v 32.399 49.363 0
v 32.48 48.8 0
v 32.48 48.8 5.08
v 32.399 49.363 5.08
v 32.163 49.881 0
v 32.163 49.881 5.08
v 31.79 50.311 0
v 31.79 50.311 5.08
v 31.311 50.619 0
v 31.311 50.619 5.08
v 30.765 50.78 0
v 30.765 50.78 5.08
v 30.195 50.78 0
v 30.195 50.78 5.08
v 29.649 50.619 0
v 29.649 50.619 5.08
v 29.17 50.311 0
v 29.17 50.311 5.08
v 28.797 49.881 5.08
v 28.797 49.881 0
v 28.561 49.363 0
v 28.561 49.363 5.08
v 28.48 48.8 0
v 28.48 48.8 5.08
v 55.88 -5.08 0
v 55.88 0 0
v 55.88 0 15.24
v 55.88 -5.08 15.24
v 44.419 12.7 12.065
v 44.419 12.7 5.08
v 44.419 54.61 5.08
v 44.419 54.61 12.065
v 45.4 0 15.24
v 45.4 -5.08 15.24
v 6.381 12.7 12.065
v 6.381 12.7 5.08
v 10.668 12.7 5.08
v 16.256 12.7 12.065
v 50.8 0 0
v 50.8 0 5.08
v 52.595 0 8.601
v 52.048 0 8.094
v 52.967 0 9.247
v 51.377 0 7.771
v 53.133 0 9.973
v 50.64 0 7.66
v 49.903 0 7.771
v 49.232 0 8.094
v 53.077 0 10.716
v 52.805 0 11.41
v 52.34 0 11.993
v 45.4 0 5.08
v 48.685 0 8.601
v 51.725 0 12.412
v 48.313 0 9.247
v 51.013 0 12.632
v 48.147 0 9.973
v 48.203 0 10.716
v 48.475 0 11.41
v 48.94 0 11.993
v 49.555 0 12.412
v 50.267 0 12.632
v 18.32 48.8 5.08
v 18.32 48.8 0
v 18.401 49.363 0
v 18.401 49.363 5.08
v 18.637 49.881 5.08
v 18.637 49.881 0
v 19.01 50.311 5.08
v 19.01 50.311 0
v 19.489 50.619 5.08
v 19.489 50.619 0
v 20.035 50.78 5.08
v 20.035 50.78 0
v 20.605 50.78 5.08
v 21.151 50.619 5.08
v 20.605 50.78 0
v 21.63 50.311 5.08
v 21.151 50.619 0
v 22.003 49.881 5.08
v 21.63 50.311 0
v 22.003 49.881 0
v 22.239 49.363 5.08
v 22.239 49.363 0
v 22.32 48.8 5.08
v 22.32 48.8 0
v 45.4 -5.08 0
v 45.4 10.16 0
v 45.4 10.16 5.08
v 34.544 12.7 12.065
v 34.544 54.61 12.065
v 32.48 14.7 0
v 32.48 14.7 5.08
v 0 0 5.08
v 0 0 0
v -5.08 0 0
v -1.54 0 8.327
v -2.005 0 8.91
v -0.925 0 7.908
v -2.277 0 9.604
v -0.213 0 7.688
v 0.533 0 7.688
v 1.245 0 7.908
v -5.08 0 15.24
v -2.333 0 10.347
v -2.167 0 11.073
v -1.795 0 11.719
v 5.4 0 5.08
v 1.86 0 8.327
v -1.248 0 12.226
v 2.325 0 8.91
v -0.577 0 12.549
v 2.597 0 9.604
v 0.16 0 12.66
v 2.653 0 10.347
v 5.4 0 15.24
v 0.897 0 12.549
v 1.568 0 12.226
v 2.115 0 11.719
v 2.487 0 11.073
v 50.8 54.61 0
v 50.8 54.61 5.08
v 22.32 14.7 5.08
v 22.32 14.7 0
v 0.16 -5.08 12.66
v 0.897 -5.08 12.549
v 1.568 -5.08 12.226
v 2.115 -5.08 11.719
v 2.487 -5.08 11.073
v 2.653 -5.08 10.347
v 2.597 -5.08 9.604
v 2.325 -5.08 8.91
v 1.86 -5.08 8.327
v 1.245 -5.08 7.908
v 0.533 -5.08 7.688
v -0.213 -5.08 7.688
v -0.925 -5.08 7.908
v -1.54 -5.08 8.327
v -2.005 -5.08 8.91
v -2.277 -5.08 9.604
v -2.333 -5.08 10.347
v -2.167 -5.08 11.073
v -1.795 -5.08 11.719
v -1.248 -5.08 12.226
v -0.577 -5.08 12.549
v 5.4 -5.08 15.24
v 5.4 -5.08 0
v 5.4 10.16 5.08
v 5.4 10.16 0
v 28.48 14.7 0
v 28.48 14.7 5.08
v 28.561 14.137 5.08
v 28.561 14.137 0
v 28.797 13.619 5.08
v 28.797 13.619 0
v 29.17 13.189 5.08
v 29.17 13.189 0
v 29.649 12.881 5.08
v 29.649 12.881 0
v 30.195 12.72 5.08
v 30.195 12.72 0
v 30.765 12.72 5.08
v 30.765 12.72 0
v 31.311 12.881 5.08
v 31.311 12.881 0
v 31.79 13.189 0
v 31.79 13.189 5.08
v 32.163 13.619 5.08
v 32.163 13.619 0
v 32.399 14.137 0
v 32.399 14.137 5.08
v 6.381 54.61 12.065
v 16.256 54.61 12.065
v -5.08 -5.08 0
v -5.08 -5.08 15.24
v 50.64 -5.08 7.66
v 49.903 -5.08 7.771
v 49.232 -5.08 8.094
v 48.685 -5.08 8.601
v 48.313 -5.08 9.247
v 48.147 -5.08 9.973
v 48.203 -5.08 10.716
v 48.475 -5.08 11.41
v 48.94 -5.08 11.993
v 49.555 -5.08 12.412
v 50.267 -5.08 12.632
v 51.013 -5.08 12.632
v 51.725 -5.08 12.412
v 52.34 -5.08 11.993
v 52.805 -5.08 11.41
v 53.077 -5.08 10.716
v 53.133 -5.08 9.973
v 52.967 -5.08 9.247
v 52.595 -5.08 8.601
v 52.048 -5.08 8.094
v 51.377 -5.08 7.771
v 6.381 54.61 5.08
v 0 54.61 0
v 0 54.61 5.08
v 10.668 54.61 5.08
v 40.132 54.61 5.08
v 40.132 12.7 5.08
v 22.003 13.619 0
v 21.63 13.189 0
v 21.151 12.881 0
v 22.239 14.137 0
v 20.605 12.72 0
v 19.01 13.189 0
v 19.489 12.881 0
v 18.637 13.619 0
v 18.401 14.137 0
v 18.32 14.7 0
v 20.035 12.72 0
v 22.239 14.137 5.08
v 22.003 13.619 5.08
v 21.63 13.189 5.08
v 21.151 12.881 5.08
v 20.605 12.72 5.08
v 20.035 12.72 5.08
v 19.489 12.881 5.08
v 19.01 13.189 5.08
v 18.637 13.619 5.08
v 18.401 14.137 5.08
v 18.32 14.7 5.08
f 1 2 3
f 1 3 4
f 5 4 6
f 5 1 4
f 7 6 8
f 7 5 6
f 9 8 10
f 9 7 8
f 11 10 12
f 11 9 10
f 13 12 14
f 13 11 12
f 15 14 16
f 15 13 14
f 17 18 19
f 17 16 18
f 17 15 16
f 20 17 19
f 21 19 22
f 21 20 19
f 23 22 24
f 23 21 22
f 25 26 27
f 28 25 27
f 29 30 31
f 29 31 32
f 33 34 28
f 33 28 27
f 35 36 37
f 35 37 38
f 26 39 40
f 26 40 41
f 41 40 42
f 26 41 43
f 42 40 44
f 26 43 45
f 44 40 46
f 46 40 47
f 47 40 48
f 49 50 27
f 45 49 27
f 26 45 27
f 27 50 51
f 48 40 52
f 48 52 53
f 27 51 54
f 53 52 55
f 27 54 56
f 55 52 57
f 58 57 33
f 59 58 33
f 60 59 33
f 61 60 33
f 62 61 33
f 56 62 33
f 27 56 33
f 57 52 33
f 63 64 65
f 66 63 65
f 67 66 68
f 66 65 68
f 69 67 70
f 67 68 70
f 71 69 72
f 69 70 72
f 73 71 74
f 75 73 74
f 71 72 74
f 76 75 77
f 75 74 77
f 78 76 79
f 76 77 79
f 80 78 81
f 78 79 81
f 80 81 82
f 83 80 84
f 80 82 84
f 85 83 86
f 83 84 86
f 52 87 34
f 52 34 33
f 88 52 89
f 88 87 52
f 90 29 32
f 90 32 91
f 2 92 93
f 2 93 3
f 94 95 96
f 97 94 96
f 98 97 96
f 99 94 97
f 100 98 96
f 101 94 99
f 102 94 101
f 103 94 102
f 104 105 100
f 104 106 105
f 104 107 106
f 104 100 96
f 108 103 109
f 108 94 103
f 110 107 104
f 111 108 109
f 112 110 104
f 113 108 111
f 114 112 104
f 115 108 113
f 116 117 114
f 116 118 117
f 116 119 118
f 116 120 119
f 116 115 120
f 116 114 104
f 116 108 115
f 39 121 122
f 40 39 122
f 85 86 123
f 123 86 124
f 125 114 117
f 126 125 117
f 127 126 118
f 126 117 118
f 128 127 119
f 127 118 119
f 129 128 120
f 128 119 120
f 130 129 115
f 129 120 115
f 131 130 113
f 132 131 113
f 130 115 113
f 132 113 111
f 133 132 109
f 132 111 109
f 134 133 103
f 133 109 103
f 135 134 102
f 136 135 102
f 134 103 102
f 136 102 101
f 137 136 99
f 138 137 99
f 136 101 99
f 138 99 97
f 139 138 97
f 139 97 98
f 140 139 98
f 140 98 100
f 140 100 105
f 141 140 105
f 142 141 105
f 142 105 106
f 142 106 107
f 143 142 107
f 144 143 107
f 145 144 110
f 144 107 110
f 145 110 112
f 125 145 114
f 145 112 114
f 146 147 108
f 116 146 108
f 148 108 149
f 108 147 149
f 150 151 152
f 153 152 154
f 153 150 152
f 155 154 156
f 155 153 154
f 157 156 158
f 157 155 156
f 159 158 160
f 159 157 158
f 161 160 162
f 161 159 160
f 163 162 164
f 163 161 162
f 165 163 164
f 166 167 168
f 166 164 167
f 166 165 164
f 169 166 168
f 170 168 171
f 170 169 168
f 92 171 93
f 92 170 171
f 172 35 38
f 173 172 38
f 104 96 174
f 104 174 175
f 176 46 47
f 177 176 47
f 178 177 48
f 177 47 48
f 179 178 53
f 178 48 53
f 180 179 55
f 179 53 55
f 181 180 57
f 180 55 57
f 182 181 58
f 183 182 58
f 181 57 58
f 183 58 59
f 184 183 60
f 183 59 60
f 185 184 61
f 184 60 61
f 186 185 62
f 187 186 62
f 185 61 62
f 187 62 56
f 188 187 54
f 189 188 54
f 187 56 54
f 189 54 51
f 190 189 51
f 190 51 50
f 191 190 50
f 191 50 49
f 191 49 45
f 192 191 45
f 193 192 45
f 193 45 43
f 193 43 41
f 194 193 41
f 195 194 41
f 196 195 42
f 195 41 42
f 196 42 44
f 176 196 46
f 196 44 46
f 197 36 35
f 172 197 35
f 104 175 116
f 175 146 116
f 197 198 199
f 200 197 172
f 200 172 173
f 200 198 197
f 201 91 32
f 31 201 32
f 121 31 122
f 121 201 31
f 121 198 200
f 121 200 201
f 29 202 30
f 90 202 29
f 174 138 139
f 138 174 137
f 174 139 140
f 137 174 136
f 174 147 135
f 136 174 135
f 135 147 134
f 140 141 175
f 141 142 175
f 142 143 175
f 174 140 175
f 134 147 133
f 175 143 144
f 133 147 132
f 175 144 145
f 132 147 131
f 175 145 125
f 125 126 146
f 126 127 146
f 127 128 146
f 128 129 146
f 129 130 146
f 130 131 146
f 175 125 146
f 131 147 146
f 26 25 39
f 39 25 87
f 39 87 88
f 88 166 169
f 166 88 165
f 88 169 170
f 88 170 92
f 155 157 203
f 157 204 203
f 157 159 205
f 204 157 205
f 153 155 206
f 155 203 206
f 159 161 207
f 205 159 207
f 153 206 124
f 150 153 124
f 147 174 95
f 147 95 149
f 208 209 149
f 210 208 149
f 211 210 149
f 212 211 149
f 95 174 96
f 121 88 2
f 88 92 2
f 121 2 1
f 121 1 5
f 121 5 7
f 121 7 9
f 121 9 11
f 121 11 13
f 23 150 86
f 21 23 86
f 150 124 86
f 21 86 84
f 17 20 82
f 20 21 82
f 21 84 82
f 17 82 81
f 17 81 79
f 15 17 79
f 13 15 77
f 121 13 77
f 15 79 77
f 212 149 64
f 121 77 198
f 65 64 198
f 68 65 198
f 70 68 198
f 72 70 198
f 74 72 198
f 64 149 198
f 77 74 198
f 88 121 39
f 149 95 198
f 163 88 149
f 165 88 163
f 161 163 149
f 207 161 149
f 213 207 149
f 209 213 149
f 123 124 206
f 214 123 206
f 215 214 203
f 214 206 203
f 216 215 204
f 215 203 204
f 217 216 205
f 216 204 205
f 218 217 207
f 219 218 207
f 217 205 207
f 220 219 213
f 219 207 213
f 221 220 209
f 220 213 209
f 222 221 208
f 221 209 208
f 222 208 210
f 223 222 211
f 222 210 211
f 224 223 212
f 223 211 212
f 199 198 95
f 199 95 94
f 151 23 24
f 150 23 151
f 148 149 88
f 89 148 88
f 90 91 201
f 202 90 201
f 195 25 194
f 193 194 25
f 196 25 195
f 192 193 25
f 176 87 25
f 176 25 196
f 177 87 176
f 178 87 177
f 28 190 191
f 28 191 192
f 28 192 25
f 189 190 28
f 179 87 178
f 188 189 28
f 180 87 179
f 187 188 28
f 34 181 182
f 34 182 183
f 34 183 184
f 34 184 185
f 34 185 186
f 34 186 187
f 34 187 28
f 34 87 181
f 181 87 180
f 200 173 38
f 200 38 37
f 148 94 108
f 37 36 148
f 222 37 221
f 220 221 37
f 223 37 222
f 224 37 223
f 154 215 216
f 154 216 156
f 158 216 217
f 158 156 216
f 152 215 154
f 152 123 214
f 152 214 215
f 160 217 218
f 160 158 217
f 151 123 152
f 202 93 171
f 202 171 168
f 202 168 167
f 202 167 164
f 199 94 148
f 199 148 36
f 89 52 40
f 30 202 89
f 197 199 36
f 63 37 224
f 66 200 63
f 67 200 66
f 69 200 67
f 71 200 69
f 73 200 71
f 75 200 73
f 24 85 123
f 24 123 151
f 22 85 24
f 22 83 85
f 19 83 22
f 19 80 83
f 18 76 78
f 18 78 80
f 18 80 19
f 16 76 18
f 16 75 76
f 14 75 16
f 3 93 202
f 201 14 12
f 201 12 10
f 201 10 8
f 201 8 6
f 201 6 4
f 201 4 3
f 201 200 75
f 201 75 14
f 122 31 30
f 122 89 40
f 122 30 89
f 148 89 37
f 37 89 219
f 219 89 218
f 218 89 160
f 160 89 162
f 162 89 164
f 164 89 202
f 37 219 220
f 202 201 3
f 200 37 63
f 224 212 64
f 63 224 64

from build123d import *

# Parameters (mm, degrees)
SKETCH1_W               = 50.8
SKETCH1_H               = 54.61
BOSS_EXTRUDE1_DEPTH     = 5.08
BOSS_EXTRUDE2_DEPTH     = 54.61
CUT_EXTRUDE1_DEPTH      = 75.911162886
CUT_EXTRUDE1_DEPTH_BACK = 5.08
SKETCH4_W               = 50.8
SKETCH4_H               = 15.24
BOSS_EXTRUDE3_DEPTH     = 5.08
CUT_EXTRUDE2_REACH      = 74.025
SKETCH5_W               = 6.985
SKETCH5_H               = 12.7
CUT_EXTRUDE3_START      = -15.24
SKETCH6_W               = 40
SKETCH6_H               = 15.24
CUT_EXTRUDE3_DEPTH      = 15.24
SKETCH8_W               = 15.24
SKETCH8_H               = 5.08
BOSS_EXTRUDE4_DEPTH     = 5.08
SKETCH9_R               = 2.5
CUT_EXTRUDE4_DEPTH      = 5.08


with BuildPart() as part:
    # Sketch1 → Boss-Extrude1 (new body)
    with BuildSketch(Plane.XY):
        with Locations((25.4, 27.305)):
            Rectangle(SKETCH1_W, SKETCH1_H)
    extrude(amount=BOSS_EXTRUDE1_DEPTH)

    # Sketch2 → Boss-Extrude2 (add)
    with BuildSketch(Plane.XZ):
        Polygon((10.668, 5.08), (6.380565044, 5.08), (6.380565044, 12.065), (16.256, 12.065), align=None)
        Polygon((34.544, 12.065), (40.132, 5.08), (44.419434956, 5.08), (44.419434956, 12.065), align=None)
    extrude(amount=-BOSS_EXTRUDE2_DEPTH)

    # Sketch3 → Cut-Extrude1 (cut, two sides: drawn at the far end of the back side and taken through both)
    with BuildSketch(Plane.XY.offset(5.08).offset(-CUT_EXTRUDE1_DEPTH_BACK)):
        with BuildLine():
            Line((22.32, 48.8), (22.32, 14.7))
            ThreePointArc((22.32, 14.7), (20.32, 12.7), (18.32, 14.7))
            Line((18.32, 14.7), (18.32, 48.8))
            ThreePointArc((18.32, 48.8), (20.32, 50.8), (22.32, 48.8))
        make_face()
        with BuildLine():
            Line((28.48, 48.8), (28.48, 14.7))
            ThreePointArc((28.48, 14.7), (30.48, 12.7), (32.48, 14.7))
            Line((32.48, 14.7), (32.48, 48.8))
            ThreePointArc((32.48, 48.8), (30.48, 50.8), (28.48, 48.8))
        make_face()
    extrude(amount=CUT_EXTRUDE1_DEPTH + CUT_EXTRUDE1_DEPTH_BACK, mode=Mode.SUBTRACT)

    # Sketch4 → Boss-Extrude3 (add)
    with BuildSketch(Plane.XZ):
        with Locations((25.4, 7.62)):
            Rectangle(SKETCH4_W, SKETCH4_H)
    extrude(amount=BOSS_EXTRUDE3_DEPTH)

    # Cut-Extrude2: up to this face of the body (flat: up to its plane)
    cut_extrude2_end = Plane(part.part.faces().sort_by_distance((44.419434956, 27.305, 8.5725))[0])
    # Sketch5 → Cut-Extrude2 (cut, up to the picked face)
    with BuildSketch(Plane.ZY.offset(-6.380565044), mode=Mode.PRIVATE) as cut_extrude2_sk1:
        with Locations((8.5725, 6.35)):
            Rectangle(SKETCH5_W, SKETCH5_H)
    cut_extrude2_tool1 = split(extrude(cut_extrude2_sk1.sketch, amount=-CUT_EXTRUDE2_REACH, mode=Mode.PRIVATE), bisect_by=cut_extrude2_end, keep=Keep.BOTH, mode=Mode.PRIVATE)
    add(cut_extrude2_tool1.solids().sort_by(Axis((6.380565, 6.35, 8.5725), (1, 0, 0)))[0], mode=Mode.SUBTRACT)

    # Sketch6 → Cut-Extrude3 (cut)
    with BuildSketch(Plane.XY.offset(15.24).offset(CUT_EXTRUDE3_START)):
        with Locations((25.4, 2.54)):
            Rectangle(SKETCH6_W, SKETCH6_H)
    extrude(amount=CUT_EXTRUDE3_DEPTH, mode=Mode.SUBTRACT)

    # Sketch8 → Boss-Extrude4 (add)
    with BuildSketch(Plane.ZY):
        with Locations((7.62, -2.54)):
            Rectangle(SKETCH8_W, SKETCH8_H)
    boss_extrude4 = extrude(amount=BOSS_EXTRUDE4_DEPTH)

    # Mirror1: Boss-Extrude4 across plane
    add(boss_extrude4.mirror(Plane.ZY.offset(-25.4)))

    # Sketch9 → Cut-Extrude4 (cut)
    with BuildSketch(Plane(origin=(0, 0, 0), x_dir=(1, 0, 0), z_dir=(0, 1, 0))):
        with Locations(Location((0.16, -10.16, 0), (0, 0, 270))):
            Circle(SKETCH9_R)
        with Locations(Location((50.64, -10.16, 0), (0, 0, 90))):
            Circle(SKETCH9_R)
    extrude(amount=-CUT_EXTRUDE4_DEPTH, mode=Mode.SUBTRACT)


solid = part.part
